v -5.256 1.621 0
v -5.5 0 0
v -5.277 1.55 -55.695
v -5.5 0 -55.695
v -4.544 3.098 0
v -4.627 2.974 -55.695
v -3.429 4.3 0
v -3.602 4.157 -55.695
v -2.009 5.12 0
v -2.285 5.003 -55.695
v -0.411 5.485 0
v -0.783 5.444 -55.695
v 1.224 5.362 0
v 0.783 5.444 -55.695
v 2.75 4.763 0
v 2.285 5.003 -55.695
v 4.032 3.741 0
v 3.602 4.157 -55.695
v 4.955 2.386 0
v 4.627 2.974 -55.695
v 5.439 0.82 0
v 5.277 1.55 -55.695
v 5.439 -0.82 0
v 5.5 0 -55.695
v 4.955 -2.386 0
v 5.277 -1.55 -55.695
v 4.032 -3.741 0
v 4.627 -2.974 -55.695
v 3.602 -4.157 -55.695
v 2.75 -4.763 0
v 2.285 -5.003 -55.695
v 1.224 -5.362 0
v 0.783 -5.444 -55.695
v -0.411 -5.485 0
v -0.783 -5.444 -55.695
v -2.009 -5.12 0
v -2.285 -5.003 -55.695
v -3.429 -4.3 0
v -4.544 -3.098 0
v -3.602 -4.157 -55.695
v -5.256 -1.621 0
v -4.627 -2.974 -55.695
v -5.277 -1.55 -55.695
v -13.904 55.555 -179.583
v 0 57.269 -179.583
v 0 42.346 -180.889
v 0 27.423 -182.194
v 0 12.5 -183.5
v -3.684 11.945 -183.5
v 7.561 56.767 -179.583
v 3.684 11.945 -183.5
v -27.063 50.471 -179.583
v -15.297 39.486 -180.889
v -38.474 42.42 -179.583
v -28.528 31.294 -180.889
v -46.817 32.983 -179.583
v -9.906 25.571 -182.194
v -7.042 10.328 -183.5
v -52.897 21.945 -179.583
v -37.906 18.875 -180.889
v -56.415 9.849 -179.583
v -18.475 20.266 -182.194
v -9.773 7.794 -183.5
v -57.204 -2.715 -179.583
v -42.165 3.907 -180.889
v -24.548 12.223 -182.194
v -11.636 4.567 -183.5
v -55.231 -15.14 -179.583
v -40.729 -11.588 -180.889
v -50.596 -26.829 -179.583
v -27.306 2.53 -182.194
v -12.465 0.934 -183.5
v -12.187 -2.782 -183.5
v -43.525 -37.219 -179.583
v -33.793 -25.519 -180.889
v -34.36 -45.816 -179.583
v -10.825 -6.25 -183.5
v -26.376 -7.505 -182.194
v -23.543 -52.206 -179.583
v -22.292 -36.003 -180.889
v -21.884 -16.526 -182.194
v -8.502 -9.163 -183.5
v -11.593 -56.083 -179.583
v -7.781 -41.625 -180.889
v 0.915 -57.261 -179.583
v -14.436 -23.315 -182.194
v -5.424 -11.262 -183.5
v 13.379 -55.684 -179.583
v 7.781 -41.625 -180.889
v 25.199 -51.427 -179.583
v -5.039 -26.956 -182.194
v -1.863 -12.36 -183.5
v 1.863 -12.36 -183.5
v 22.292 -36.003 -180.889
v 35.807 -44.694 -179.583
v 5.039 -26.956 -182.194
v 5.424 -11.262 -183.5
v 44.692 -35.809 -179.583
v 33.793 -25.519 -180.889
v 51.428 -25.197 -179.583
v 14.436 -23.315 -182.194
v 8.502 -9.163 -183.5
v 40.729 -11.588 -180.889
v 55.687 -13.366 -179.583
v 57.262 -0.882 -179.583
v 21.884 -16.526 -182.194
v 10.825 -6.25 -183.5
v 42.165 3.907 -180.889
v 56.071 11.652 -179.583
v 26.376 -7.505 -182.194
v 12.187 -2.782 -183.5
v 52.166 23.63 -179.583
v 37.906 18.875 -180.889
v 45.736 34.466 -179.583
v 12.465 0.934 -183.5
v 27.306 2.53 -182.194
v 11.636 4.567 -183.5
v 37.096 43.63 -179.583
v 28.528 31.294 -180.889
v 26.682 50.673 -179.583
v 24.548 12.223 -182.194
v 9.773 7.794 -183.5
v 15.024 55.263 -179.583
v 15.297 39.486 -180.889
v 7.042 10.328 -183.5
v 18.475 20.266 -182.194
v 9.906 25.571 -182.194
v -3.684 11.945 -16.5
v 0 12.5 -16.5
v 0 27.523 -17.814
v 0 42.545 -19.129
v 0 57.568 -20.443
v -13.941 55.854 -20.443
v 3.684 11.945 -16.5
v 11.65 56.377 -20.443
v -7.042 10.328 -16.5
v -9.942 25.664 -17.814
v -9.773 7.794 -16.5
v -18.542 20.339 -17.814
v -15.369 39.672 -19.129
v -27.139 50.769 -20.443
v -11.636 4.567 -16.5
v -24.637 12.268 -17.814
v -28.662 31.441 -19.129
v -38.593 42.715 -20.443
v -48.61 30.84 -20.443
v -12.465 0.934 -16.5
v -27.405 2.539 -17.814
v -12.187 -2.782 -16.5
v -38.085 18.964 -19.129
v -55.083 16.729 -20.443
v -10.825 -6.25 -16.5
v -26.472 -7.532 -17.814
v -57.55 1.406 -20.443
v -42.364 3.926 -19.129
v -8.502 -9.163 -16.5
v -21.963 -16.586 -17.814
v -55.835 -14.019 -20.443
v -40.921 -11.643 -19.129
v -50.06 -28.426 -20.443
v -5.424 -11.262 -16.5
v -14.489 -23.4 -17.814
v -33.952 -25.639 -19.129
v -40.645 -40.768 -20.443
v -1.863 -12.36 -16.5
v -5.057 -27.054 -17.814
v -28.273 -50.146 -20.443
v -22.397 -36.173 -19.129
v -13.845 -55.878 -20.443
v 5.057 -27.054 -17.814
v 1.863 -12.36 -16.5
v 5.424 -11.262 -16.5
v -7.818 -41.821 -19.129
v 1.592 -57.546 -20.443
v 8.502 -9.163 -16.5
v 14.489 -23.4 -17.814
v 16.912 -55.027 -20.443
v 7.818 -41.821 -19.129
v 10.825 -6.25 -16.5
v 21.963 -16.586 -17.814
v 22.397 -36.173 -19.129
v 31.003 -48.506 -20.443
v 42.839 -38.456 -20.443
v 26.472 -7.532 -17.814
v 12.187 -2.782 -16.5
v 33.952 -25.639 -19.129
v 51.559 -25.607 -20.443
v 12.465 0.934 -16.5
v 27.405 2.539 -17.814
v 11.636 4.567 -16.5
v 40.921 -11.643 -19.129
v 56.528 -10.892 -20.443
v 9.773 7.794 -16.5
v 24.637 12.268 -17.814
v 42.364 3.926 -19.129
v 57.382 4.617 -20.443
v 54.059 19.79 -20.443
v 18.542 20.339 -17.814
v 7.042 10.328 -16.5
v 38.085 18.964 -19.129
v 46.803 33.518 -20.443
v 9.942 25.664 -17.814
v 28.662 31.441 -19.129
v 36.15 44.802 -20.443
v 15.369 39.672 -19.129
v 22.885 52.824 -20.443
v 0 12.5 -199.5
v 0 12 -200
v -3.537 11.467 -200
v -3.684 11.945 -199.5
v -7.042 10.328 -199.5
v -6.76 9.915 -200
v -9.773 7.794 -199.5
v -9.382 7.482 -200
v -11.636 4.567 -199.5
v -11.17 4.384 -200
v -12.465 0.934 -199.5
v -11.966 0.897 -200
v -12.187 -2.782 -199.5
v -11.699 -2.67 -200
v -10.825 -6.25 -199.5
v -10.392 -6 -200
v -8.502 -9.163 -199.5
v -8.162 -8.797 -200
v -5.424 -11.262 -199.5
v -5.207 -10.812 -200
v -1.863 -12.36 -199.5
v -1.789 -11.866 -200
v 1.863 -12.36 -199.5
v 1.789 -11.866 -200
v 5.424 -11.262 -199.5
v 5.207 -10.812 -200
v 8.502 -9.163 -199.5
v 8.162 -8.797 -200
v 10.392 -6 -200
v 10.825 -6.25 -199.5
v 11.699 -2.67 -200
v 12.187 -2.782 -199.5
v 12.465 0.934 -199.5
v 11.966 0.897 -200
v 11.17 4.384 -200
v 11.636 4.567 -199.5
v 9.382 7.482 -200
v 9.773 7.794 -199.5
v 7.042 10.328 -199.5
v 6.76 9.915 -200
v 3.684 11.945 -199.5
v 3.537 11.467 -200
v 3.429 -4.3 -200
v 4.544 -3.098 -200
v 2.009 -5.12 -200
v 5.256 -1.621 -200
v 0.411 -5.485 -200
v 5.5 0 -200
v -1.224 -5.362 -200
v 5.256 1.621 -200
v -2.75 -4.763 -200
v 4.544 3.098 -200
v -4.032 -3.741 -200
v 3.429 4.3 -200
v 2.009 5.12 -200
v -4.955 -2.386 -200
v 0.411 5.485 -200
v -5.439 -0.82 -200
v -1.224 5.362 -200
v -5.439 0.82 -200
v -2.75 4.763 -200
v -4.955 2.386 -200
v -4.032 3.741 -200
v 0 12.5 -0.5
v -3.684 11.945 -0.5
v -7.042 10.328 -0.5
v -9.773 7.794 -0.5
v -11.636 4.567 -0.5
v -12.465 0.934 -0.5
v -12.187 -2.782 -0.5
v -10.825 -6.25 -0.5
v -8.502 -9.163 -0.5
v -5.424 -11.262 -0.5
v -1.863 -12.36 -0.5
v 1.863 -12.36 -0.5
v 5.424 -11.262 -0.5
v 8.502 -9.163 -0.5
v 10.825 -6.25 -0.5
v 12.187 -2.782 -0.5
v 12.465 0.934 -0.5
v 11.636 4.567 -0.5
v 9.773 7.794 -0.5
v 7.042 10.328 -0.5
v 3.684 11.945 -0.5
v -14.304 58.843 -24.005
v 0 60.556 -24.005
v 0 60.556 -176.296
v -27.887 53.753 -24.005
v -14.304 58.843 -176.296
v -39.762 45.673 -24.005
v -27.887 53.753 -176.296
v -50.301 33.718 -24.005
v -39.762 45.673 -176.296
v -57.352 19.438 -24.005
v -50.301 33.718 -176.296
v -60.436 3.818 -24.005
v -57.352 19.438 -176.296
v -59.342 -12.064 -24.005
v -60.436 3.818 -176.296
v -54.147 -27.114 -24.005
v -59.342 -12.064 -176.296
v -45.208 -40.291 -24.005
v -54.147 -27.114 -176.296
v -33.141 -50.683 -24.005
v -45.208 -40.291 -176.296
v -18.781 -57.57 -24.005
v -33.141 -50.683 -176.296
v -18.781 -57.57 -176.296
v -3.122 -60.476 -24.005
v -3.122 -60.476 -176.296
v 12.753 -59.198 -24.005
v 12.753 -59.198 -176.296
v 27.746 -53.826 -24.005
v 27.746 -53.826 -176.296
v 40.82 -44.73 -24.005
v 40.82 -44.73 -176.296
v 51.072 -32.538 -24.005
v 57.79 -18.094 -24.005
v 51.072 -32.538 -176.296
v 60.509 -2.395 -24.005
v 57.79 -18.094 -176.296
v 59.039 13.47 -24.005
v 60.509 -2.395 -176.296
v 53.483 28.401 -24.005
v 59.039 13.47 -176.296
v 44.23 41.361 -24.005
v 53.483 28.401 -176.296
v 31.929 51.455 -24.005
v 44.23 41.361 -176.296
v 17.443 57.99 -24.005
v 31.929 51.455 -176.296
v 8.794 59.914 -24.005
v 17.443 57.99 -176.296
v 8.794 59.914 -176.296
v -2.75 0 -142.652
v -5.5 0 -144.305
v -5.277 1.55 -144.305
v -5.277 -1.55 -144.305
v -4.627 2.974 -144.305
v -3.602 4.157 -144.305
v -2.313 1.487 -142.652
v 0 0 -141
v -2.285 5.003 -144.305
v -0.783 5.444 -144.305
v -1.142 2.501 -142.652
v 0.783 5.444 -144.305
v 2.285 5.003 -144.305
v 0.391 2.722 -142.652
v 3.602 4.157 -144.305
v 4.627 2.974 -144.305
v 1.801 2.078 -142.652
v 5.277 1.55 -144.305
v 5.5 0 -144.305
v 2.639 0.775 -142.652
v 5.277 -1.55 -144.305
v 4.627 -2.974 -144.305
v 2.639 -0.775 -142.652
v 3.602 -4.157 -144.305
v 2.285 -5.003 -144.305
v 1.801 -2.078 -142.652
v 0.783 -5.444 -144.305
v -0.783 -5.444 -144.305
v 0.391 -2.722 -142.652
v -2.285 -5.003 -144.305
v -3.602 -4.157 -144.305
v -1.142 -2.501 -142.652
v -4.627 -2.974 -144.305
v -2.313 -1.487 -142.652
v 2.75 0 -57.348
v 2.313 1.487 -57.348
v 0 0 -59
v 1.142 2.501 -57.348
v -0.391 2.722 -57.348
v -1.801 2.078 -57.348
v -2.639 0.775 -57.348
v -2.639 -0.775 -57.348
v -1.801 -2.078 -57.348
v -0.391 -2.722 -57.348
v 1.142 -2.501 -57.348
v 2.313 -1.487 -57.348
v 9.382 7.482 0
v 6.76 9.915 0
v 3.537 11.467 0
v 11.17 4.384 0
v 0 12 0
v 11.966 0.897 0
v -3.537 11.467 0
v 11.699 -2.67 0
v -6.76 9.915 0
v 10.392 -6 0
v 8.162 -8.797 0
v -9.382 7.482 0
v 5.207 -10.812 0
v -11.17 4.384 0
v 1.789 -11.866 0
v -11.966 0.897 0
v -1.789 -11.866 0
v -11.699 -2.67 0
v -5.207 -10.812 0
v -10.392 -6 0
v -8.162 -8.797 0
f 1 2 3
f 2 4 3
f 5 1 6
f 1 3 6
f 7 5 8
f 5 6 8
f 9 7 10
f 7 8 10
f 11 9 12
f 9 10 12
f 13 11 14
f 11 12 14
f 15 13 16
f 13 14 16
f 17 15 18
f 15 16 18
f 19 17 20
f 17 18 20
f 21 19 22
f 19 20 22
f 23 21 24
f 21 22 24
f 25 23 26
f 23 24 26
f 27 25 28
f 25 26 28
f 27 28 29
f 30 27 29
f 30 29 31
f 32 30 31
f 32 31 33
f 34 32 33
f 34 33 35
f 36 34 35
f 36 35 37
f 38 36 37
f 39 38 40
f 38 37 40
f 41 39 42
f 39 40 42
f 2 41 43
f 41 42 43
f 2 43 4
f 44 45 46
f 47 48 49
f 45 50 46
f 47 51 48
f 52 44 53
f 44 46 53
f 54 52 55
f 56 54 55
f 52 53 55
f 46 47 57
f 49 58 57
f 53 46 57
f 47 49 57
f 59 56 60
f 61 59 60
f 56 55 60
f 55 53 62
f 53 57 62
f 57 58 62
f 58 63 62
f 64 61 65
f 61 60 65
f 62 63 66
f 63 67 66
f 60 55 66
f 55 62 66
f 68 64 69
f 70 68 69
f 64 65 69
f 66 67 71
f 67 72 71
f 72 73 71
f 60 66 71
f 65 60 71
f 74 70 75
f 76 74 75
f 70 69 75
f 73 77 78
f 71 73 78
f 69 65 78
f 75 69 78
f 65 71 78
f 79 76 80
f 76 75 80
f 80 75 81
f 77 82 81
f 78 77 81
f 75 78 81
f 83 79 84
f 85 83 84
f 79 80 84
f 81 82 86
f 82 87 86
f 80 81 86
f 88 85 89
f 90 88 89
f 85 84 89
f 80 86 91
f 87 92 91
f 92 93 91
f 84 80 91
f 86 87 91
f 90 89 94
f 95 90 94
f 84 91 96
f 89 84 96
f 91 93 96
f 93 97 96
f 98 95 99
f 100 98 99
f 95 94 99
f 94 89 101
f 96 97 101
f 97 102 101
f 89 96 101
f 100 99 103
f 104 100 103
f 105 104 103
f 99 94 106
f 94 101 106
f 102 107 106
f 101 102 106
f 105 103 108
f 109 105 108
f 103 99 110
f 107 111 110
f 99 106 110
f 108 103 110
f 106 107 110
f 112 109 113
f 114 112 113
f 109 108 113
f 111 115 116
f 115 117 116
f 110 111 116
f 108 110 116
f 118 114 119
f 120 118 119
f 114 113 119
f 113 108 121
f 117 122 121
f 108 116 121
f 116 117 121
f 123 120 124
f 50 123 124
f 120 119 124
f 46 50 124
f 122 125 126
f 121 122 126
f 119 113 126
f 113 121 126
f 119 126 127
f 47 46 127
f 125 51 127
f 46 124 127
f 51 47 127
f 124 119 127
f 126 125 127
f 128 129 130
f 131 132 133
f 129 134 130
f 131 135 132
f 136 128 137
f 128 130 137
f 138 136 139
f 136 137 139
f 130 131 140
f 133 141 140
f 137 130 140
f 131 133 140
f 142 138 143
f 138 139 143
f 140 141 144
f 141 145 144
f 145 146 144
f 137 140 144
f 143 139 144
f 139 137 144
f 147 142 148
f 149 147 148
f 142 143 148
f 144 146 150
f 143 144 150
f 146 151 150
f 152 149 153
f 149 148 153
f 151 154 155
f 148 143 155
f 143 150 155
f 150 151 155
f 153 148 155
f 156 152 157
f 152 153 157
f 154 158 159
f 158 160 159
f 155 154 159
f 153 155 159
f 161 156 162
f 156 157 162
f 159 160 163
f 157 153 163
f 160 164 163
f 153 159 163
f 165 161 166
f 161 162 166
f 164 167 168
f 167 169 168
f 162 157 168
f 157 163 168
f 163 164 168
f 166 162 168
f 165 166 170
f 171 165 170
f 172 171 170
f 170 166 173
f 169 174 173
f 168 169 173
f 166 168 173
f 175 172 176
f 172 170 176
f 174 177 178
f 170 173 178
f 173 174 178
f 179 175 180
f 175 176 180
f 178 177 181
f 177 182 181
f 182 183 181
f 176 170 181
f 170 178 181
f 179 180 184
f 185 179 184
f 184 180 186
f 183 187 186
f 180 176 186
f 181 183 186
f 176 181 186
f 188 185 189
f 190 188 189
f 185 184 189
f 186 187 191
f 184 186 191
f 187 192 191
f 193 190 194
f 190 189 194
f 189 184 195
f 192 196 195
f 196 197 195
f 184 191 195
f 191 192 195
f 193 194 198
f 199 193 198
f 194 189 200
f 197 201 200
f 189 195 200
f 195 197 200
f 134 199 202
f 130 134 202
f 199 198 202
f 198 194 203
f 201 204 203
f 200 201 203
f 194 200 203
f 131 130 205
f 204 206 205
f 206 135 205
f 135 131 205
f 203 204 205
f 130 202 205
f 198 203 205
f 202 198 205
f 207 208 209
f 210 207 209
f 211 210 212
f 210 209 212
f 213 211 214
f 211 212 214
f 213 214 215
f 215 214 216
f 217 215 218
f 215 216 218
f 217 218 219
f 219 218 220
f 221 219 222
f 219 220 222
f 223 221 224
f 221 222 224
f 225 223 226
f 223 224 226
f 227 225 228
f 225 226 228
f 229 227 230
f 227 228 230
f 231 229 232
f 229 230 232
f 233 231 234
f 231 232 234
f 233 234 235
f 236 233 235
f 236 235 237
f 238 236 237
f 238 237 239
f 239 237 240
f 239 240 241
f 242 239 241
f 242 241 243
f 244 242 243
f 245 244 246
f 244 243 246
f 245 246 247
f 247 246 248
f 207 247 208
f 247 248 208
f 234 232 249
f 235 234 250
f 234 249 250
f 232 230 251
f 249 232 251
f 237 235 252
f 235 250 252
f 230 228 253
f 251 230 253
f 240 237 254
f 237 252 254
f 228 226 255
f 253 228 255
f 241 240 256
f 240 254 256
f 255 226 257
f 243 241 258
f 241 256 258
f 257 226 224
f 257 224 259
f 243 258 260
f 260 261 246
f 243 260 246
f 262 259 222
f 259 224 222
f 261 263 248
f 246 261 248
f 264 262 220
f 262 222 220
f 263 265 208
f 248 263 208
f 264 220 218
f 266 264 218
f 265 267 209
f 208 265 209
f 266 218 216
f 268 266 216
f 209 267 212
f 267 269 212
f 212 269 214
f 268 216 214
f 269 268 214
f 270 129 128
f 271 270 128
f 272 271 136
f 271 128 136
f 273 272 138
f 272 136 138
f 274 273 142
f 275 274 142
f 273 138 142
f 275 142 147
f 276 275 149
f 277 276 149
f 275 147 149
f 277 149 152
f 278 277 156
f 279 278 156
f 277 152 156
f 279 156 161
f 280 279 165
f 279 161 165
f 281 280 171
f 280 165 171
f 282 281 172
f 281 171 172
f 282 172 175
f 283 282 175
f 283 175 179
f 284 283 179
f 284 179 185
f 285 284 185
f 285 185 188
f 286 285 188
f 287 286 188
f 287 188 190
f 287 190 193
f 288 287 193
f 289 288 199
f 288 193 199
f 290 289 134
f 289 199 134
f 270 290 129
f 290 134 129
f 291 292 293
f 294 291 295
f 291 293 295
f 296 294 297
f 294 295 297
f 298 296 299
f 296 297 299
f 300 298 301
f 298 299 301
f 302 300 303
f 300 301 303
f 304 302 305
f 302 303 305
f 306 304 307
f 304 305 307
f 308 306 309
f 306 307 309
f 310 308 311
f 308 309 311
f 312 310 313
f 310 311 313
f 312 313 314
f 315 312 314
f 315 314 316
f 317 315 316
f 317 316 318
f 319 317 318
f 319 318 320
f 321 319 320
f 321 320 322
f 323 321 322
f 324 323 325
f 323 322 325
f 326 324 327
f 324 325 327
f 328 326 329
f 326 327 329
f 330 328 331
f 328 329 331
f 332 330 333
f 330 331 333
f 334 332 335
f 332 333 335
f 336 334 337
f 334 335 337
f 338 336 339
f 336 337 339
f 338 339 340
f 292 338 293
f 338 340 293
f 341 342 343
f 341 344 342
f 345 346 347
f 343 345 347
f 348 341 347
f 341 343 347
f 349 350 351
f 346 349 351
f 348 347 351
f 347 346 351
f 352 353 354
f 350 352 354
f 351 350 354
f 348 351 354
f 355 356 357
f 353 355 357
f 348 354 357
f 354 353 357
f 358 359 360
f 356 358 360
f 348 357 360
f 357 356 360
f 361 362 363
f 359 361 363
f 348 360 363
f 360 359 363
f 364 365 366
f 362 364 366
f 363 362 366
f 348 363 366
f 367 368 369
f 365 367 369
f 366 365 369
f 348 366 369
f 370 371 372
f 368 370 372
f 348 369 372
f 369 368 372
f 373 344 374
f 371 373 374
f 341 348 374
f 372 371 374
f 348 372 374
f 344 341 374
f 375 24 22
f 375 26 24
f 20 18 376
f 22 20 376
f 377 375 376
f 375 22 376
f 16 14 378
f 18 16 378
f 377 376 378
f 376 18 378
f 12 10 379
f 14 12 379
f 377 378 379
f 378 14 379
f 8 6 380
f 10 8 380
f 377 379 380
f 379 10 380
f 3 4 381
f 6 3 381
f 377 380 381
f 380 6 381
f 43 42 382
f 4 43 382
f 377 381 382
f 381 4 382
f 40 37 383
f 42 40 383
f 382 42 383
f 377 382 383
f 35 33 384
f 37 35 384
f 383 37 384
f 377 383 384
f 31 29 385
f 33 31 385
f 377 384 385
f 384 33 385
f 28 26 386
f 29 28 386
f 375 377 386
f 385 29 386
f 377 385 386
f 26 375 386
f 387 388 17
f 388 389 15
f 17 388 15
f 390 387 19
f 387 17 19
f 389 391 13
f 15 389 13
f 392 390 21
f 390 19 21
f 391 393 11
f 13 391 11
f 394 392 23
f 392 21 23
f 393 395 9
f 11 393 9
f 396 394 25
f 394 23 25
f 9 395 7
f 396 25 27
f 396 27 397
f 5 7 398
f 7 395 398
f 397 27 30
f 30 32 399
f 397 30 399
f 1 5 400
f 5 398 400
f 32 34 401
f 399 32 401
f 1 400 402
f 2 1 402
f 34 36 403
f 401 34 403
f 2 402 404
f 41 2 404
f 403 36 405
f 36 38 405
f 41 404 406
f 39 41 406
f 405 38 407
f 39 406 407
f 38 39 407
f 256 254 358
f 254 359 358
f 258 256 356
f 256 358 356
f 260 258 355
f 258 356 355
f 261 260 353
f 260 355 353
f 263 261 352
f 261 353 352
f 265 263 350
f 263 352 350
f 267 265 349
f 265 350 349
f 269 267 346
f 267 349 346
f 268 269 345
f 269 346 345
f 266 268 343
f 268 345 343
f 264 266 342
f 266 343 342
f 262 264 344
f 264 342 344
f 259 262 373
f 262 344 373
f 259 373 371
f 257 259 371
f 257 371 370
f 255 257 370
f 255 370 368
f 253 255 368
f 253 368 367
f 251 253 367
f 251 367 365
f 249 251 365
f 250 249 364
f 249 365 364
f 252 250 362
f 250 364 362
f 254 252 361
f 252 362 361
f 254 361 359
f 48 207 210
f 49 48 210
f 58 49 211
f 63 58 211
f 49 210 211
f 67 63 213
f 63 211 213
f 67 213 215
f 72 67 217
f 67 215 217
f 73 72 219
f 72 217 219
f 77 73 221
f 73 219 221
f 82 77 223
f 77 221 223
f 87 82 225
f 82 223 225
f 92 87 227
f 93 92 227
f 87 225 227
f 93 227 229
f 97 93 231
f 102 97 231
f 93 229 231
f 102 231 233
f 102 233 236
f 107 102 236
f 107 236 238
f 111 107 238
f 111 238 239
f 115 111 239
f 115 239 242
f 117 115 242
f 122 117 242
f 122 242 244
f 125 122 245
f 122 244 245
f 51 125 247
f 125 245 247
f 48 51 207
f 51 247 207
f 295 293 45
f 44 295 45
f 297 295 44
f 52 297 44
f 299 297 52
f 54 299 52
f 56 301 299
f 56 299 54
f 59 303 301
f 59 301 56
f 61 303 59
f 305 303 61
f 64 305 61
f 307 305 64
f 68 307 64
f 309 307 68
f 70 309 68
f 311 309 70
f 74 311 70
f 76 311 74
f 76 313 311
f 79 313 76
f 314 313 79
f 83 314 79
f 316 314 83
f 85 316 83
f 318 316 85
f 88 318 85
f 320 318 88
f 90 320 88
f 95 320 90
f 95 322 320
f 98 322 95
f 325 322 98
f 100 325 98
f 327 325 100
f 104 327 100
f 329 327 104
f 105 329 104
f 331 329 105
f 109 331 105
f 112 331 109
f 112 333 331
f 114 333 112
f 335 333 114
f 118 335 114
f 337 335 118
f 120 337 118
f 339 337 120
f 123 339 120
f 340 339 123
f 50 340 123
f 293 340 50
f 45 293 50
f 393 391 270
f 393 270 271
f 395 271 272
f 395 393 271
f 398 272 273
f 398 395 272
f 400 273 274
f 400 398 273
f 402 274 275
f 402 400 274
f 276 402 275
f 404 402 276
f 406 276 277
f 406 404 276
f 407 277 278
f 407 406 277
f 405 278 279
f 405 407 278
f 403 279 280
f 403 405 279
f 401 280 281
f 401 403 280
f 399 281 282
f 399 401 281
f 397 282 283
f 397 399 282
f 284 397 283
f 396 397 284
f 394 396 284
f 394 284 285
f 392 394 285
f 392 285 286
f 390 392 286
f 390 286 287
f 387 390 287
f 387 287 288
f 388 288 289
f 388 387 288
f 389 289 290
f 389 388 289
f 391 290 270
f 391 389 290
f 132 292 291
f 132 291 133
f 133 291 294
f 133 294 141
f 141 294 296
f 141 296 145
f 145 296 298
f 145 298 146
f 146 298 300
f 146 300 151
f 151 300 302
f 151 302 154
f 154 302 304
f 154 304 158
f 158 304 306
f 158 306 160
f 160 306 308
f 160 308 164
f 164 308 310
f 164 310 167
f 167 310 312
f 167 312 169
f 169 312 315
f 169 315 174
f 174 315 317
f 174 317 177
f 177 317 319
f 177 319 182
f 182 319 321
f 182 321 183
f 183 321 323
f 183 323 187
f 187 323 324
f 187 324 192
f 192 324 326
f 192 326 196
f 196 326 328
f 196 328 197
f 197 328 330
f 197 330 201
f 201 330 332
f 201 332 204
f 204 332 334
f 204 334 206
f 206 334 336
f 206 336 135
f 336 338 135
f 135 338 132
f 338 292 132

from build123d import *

# Parameters (mm, degrees)
CHAFL_N1_SIZE2                    = 3.300188603
CHAFL_N1_SIZE                     = 3
CHAFL_N1_EDGE_2_SIZE2             = 3
CHAFL_N1_EDGE_2_SIZE              = 3.300188603
CHAFL_N2_SIZE                     = 0.5
TALADRO_DE_MARGEN_PARA_M101_D     = 11
TALADRO_DE_MARGEN_PARA_M101_DEPTH = 55.695266595
TALADRO_DE_MARGEN_PARA_M101_TIP   = 3.304733405
TALADRO_DE_MARGEN_PARA_M102_D     = 11
TALADRO_DE_MARGEN_PARA_M102_DEPTH = 55.695266595
TALADRO_DE_MARGEN_PARA_M102_TIP   = 3.304733405


with BuildPart() as part:
    # Croquis1 → Revolución1 (revolve)
    with BuildSketch(Plane(origin=(0, 0, 0), x_dir=(0, 0, -1), z_dir=(1, 0, 0))):
        Polygon((0, 0), (0, 12.5), (16.5, 12.5), (20.704376009, 60.556237686), (179.295623991, 60.556237686), (183.5, 12.5), (200, 12.5), (200, 0), align=None)
    revolve(axis=Axis((0, 0, -200), (0, 0, 1)))

    # Chaflán1
    chafl_n1_edges = [part.edges().sort_by_distance(p)[0] for p in [
        (0, -60.556237686, -179.295623991),
    ]]
    chamfer(chafl_n1_edges, length=CHAFL_N1_SIZE, length2=CHAFL_N1_SIZE2)

    # Chaflán1 edge 2
    chafl_n1_edge_2_edges = [part.edges().sort_by_distance(p)[0] for p in [
        (0, -60.556237686, -20.704376009),
    ]]
    chamfer(chafl_n1_edge_2_edges, length=CHAFL_N1_EDGE_2_SIZE, length2=CHAFL_N1_EDGE_2_SIZE2)

    # Chaflán2
    chafl_n2_edges = [part.edges().sort_by_distance(p)[0] for p in [
        (0, -12.5, -200),
        (0, -12.5, 0),
    ]]
    chamfer(chafl_n2_edges, length=CHAFL_N2_SIZE)

    # Taladro de margen para M101
    with Locations(Plane(origin=(0, 0, -200), x_dir=(-1, 0, 0), z_dir=(0, 0, -1))):
        with Locations((0, 0)):
            Hole(TALADRO_DE_MARGEN_PARA_M101_D / 2, depth=TALADRO_DE_MARGEN_PARA_M101_DEPTH)
            with Locations((0, 0, -(TALADRO_DE_MARGEN_PARA_M101_DEPTH + TALADRO_DE_MARGEN_PARA_M101_TIP / 2))):  # 118° drill point
                Cone(0, TALADRO_DE_MARGEN_PARA_M101_D / 2, TALADRO_DE_MARGEN_PARA_M101_TIP, mode=Mode.SUBTRACT)

    # Taladro de margen para M102
    with Locations(Plane.XY):
        with Locations((0, 0)):
            Hole(TALADRO_DE_MARGEN_PARA_M102_D / 2, depth=TALADRO_DE_MARGEN_PARA_M102_DEPTH)
            with Locations((0, 0, -(TALADRO_DE_MARGEN_PARA_M102_DEPTH + TALADRO_DE_MARGEN_PARA_M102_TIP / 2))):  # 118° drill point
                Cone(0, TALADRO_DE_MARGEN_PARA_M102_D / 2, TALADRO_DE_MARGEN_PARA_M102_TIP, mode=Mode.SUBTRACT)


solid = part.part
